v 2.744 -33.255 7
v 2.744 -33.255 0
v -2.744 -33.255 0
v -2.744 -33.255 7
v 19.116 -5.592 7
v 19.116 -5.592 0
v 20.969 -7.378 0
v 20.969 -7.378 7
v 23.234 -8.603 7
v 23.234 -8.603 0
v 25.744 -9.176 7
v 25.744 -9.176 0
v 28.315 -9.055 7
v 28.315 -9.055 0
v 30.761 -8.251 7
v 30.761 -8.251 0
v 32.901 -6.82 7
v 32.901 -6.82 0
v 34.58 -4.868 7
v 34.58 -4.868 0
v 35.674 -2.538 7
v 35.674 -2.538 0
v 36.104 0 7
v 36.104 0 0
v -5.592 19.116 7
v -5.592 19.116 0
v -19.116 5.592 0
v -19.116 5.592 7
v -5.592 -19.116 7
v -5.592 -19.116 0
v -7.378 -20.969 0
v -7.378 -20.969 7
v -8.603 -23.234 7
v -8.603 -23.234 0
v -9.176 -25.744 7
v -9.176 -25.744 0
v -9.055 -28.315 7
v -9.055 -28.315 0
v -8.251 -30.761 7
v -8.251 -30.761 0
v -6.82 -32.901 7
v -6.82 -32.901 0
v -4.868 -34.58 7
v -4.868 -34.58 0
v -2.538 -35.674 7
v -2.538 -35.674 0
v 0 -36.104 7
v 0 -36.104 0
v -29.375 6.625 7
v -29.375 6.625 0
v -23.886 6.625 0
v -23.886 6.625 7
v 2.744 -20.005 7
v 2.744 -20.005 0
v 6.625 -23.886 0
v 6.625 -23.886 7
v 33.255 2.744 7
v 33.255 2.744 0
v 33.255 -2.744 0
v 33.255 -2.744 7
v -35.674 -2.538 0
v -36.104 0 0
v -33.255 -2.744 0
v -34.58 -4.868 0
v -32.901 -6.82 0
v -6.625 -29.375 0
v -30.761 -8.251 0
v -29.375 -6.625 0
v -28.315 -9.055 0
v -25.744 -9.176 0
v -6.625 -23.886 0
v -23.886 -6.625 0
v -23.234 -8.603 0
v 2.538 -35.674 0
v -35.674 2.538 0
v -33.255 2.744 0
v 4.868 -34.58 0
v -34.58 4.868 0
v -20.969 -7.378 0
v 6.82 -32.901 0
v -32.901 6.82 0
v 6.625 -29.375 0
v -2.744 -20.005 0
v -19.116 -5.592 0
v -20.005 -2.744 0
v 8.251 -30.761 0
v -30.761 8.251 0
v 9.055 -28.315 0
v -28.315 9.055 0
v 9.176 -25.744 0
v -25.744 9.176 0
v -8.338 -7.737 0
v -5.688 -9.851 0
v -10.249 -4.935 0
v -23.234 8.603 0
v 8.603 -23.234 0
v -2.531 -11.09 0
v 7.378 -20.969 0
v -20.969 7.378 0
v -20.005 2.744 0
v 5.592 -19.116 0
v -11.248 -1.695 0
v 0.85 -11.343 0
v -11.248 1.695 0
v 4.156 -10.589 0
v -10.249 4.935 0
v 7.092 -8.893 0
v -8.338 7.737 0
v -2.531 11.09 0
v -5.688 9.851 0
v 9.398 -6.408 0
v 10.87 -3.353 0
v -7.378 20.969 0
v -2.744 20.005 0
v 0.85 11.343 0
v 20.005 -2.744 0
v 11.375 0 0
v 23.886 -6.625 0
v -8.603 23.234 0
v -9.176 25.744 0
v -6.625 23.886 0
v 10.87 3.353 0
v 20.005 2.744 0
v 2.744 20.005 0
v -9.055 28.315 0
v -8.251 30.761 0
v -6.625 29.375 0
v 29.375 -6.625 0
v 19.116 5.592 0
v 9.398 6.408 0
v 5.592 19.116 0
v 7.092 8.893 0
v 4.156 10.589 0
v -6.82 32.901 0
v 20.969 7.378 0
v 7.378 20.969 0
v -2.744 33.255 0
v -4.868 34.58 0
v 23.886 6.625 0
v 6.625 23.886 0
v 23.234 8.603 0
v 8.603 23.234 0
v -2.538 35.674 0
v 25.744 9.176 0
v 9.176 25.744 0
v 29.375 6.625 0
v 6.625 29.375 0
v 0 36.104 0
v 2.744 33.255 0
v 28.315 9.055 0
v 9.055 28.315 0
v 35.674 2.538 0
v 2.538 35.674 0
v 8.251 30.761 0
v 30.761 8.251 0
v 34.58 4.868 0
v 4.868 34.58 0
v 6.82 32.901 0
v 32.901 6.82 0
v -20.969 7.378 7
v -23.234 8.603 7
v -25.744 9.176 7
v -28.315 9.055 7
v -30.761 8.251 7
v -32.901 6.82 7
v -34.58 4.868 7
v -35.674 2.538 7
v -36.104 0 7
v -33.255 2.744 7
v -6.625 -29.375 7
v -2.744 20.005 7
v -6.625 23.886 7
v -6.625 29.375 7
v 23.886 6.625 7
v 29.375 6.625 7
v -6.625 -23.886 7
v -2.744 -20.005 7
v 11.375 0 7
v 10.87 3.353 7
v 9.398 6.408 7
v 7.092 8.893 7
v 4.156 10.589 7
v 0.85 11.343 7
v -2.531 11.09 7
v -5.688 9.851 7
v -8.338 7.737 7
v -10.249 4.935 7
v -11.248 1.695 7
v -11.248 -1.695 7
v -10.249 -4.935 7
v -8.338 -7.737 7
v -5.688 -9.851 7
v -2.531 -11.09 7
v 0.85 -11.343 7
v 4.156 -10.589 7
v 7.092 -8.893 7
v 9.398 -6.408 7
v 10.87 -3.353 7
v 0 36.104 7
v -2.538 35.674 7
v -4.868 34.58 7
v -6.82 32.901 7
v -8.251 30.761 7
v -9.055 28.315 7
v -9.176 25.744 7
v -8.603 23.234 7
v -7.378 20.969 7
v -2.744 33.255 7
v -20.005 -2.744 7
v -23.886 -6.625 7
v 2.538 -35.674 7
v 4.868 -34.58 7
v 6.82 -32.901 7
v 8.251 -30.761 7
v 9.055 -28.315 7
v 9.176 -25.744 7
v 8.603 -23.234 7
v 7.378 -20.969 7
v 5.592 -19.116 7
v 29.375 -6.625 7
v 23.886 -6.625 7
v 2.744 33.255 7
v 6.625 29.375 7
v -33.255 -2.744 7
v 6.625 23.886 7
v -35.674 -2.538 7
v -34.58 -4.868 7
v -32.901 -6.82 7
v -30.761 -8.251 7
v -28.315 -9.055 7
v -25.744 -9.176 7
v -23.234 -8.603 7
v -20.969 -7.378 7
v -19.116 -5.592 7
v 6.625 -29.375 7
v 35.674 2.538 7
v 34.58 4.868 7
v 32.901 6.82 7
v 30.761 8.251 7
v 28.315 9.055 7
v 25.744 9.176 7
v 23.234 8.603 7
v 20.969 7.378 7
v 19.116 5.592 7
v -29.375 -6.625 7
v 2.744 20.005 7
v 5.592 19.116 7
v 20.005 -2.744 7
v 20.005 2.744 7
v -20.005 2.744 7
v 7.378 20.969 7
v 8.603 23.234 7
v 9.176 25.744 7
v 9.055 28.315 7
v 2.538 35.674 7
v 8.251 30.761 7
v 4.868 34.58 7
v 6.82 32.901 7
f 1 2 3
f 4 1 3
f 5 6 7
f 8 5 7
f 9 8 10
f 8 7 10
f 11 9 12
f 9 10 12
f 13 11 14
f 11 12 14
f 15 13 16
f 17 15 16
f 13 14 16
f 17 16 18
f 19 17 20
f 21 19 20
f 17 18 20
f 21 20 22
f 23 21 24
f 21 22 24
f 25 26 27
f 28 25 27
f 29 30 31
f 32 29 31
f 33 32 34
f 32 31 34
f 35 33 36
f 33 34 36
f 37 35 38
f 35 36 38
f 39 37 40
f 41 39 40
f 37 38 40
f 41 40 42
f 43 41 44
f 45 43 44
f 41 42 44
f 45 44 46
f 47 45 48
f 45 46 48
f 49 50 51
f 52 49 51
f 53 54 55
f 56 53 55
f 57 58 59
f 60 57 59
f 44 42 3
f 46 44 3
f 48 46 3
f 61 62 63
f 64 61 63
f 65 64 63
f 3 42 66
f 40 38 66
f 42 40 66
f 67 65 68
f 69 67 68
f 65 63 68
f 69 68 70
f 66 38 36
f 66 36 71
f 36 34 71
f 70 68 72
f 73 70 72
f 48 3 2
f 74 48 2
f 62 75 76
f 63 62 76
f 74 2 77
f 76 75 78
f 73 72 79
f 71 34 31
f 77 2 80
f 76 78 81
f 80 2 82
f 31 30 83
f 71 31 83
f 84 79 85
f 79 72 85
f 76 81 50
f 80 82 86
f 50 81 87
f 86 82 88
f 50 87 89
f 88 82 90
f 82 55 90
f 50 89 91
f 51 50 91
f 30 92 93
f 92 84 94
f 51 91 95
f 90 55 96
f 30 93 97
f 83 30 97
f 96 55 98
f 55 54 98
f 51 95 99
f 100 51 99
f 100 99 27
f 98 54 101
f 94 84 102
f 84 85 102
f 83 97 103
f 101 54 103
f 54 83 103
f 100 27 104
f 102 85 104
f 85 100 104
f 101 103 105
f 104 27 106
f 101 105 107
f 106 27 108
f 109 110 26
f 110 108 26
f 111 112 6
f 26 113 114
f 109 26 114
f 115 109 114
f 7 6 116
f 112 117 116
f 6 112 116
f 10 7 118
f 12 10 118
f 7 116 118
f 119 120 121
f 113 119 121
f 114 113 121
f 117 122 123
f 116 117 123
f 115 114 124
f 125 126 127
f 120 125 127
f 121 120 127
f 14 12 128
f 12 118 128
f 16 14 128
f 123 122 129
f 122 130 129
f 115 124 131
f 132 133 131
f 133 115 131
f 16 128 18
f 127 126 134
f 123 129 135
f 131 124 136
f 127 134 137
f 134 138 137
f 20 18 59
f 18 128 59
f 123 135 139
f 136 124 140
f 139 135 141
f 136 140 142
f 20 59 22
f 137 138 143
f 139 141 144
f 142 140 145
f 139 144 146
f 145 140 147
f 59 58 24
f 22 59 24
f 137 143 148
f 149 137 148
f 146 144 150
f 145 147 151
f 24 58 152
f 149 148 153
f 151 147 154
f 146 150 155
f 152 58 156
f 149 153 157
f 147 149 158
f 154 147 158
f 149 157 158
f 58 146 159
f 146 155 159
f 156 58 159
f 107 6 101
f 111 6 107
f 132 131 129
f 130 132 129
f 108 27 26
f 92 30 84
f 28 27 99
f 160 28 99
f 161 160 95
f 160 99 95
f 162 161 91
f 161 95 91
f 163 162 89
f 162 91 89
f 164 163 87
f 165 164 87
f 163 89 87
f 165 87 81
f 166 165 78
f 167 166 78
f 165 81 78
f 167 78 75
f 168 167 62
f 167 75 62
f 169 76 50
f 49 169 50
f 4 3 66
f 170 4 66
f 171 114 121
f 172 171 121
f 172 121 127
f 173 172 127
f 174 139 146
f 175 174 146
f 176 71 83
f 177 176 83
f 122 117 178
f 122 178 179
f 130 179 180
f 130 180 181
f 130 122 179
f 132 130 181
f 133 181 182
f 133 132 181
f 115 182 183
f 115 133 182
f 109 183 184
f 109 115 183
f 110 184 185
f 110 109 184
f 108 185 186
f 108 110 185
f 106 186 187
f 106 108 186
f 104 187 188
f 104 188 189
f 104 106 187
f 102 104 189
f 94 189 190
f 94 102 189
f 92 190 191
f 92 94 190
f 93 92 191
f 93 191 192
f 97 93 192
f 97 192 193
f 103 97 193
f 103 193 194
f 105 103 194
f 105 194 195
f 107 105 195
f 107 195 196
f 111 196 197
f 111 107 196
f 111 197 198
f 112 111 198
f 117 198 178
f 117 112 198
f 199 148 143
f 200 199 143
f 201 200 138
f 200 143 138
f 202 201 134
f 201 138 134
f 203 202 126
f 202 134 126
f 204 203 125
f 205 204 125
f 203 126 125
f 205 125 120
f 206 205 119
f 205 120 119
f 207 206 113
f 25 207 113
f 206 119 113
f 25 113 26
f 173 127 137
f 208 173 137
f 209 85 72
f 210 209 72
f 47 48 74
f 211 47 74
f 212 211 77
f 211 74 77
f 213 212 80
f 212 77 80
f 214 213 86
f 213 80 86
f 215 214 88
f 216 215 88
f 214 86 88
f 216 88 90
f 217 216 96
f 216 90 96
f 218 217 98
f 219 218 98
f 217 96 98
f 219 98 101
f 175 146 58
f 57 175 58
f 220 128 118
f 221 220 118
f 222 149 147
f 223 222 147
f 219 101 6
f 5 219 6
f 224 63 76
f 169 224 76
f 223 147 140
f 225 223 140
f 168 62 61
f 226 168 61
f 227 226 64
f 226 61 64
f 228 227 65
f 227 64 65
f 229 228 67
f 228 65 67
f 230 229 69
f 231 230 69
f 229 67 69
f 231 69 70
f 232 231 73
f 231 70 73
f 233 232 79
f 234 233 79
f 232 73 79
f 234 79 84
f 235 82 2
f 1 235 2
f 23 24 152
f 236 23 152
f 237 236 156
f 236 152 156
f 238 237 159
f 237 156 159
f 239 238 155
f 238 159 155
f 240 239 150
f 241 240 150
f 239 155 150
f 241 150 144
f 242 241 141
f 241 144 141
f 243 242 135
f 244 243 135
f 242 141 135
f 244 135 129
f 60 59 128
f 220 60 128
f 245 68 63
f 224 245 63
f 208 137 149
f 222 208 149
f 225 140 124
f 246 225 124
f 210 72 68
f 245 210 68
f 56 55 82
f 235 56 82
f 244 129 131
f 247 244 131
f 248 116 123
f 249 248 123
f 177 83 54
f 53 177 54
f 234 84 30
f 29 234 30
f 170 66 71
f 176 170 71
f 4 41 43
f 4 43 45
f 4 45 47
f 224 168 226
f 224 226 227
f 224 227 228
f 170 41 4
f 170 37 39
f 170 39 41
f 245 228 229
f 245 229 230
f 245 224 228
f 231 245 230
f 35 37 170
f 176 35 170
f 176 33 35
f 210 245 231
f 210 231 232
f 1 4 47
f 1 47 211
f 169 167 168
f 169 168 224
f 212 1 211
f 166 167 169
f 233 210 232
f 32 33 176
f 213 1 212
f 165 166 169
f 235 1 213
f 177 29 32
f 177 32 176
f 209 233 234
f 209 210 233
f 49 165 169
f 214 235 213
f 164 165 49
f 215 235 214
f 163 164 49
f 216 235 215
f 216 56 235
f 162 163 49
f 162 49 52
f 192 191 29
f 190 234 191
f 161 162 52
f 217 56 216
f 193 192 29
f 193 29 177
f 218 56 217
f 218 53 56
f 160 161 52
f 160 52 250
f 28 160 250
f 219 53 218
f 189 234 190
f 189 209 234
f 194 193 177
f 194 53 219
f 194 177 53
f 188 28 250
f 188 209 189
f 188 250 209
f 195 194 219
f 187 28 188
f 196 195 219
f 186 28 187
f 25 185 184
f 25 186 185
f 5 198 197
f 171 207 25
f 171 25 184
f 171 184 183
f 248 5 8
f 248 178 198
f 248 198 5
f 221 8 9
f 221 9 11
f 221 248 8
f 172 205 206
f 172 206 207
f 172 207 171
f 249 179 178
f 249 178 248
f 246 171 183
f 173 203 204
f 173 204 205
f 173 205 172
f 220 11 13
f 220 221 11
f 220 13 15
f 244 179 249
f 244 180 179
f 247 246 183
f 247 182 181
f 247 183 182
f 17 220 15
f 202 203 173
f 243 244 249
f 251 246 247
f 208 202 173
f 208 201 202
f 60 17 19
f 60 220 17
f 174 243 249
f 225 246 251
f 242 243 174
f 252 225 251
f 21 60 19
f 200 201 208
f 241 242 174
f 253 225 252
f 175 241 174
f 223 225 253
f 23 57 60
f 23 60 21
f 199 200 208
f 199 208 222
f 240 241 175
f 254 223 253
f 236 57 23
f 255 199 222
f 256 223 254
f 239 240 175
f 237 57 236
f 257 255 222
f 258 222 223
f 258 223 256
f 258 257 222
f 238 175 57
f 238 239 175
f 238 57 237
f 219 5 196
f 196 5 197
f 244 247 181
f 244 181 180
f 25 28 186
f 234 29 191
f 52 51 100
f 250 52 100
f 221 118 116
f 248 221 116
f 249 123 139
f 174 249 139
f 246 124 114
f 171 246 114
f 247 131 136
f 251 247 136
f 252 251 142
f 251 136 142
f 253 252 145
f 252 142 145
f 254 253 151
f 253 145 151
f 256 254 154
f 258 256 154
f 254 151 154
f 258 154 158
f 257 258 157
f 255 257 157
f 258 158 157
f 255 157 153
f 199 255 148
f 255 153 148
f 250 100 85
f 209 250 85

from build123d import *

# Parameters (mm, degrees)
F0_R     = 11.375
F1_DEPTH = 7


with BuildPart() as f1:
    # F0 (on Top) → F1 (new body)
    with BuildSketch(Plane.XY):
        Polygon((-5.591883, -19.115768), (-5.591883, -13.5), (-13.5, -5.591883), (-19.115768, -5.591883), align=None)
        Polygon((-13.5, 5.591883), (-5.591883, 13.5), (-5.591883, 19.115768), (-19.115768, 5.591883), align=None)
        with BuildLine():
            Line((-5.591883, 13.5), (5.591883, 13.5))
            Line((5.591883, 13.5), (5.591883, 19.115768))
            ThreePointArc((5.591883, 19.115768), (8.736079, 29.565264), (0, 36.104289))
            ThreePointArc((0, 36.104289), (-8.736079, 29.565264), (-5.591883, 19.115768))
            Line((-5.591883, 19.115768), (-5.591883, 13.5))
        make_face()
        Polygon((2.744165, 33.255364), (6.625, 29.374529), (6.625, 23.8862), (2.744165, 20.005364), (-2.744165, 20.005364), (-6.625, 23.8862), (-6.625, 29.374529), (-2.744165, 33.255364), align=None, mode=Mode.SUBTRACT)
        with BuildLine():
            Line((-13.5, -5.591883), (-13.5, 5.591883))
            Line((-13.5, 5.591883), (-19.115768, 5.591883))
            ThreePointArc((-19.115768, 5.591883), (-29.565264, 8.736079), (-36.104289, 0))
            ThreePointArc((-36.104289, 0), (-29.565264, -8.736079), (-19.115768, -5.591883))
            Line((-19.115768, -5.591883), (-13.5, -5.591883))
        make_face()
        Polygon((-20.005364, 2.744165), (-20.005364, -2.744165), (-23.8862, -6.625), (-29.374529, -6.625), (-33.255364, -2.744165), (-33.255364, 2.744165), (-29.374529, 6.625), (-23.8862, 6.625), align=None, mode=Mode.SUBTRACT)
        Polygon((5.591883, 13.5), (13.5, 5.591883), (19.115768, 5.591883), (5.591883, 19.115768), align=None)
        with BuildLine():
            Line((19.115768, 5.591883), (13.5, 5.591883))
            Line((13.5, 5.591883), (13.5, -5.591883))
            Line((13.5, -5.591883), (19.115768, -5.591883))
            ThreePointArc((19.115768, -5.591883), (29.565264, -8.736079), (36.104289, 0))
            ThreePointArc((36.104289, 0), (29.565264, 8.736079), (19.115768, 5.591883))
        make_face()
        Polygon((20.005364, -2.744165), (20.005364, 2.744165), (23.8862, 6.625), (29.374529, 6.625), (33.255364, 2.744165), (33.255364, -2.744165), (29.374529, -6.625), (23.8862, -6.625), align=None, mode=Mode.SUBTRACT)
        Polygon((19.115768, -5.591883), (13.5, -5.591883), (5.591883, -13.5), (5.591883, -19.115768), align=None)
        with BuildLine():
            Line((5.591883, -19.115768), (5.591883, -13.5))
            Line((5.591883, -13.5), (-5.591883, -13.5))
            Line((-5.591883, -13.5), (-5.591883, -19.115768))
            ThreePointArc((-5.591883, -19.115768), (-8.736079, -29.565264), (0, -36.104289))
            ThreePointArc((0, -36.104289), (8.736079, -29.565264), (5.591883, -19.115768))
        make_face()
        Polygon((-2.744165, -20.005364), (2.744165, -20.005364), (6.625, -23.8862), (6.625, -29.374529), (2.744165, -33.255364), (-2.744165, -33.255364), (-6.625, -29.374529), (-6.625, -23.8862), align=None, mode=Mode.SUBTRACT)
        Polygon((13.5, -5.591883), (13.5, 5.591883), (5.591883, 13.5), (-5.591883, 13.5), (-13.5, 5.591883), (-13.5, -5.591883), (-5.591883, -13.5), (5.591883, -13.5), align=None)
        Circle(F0_R, mode=Mode.SUBTRACT)
    extrude(amount=F1_DEPTH)


solid = f1.part
